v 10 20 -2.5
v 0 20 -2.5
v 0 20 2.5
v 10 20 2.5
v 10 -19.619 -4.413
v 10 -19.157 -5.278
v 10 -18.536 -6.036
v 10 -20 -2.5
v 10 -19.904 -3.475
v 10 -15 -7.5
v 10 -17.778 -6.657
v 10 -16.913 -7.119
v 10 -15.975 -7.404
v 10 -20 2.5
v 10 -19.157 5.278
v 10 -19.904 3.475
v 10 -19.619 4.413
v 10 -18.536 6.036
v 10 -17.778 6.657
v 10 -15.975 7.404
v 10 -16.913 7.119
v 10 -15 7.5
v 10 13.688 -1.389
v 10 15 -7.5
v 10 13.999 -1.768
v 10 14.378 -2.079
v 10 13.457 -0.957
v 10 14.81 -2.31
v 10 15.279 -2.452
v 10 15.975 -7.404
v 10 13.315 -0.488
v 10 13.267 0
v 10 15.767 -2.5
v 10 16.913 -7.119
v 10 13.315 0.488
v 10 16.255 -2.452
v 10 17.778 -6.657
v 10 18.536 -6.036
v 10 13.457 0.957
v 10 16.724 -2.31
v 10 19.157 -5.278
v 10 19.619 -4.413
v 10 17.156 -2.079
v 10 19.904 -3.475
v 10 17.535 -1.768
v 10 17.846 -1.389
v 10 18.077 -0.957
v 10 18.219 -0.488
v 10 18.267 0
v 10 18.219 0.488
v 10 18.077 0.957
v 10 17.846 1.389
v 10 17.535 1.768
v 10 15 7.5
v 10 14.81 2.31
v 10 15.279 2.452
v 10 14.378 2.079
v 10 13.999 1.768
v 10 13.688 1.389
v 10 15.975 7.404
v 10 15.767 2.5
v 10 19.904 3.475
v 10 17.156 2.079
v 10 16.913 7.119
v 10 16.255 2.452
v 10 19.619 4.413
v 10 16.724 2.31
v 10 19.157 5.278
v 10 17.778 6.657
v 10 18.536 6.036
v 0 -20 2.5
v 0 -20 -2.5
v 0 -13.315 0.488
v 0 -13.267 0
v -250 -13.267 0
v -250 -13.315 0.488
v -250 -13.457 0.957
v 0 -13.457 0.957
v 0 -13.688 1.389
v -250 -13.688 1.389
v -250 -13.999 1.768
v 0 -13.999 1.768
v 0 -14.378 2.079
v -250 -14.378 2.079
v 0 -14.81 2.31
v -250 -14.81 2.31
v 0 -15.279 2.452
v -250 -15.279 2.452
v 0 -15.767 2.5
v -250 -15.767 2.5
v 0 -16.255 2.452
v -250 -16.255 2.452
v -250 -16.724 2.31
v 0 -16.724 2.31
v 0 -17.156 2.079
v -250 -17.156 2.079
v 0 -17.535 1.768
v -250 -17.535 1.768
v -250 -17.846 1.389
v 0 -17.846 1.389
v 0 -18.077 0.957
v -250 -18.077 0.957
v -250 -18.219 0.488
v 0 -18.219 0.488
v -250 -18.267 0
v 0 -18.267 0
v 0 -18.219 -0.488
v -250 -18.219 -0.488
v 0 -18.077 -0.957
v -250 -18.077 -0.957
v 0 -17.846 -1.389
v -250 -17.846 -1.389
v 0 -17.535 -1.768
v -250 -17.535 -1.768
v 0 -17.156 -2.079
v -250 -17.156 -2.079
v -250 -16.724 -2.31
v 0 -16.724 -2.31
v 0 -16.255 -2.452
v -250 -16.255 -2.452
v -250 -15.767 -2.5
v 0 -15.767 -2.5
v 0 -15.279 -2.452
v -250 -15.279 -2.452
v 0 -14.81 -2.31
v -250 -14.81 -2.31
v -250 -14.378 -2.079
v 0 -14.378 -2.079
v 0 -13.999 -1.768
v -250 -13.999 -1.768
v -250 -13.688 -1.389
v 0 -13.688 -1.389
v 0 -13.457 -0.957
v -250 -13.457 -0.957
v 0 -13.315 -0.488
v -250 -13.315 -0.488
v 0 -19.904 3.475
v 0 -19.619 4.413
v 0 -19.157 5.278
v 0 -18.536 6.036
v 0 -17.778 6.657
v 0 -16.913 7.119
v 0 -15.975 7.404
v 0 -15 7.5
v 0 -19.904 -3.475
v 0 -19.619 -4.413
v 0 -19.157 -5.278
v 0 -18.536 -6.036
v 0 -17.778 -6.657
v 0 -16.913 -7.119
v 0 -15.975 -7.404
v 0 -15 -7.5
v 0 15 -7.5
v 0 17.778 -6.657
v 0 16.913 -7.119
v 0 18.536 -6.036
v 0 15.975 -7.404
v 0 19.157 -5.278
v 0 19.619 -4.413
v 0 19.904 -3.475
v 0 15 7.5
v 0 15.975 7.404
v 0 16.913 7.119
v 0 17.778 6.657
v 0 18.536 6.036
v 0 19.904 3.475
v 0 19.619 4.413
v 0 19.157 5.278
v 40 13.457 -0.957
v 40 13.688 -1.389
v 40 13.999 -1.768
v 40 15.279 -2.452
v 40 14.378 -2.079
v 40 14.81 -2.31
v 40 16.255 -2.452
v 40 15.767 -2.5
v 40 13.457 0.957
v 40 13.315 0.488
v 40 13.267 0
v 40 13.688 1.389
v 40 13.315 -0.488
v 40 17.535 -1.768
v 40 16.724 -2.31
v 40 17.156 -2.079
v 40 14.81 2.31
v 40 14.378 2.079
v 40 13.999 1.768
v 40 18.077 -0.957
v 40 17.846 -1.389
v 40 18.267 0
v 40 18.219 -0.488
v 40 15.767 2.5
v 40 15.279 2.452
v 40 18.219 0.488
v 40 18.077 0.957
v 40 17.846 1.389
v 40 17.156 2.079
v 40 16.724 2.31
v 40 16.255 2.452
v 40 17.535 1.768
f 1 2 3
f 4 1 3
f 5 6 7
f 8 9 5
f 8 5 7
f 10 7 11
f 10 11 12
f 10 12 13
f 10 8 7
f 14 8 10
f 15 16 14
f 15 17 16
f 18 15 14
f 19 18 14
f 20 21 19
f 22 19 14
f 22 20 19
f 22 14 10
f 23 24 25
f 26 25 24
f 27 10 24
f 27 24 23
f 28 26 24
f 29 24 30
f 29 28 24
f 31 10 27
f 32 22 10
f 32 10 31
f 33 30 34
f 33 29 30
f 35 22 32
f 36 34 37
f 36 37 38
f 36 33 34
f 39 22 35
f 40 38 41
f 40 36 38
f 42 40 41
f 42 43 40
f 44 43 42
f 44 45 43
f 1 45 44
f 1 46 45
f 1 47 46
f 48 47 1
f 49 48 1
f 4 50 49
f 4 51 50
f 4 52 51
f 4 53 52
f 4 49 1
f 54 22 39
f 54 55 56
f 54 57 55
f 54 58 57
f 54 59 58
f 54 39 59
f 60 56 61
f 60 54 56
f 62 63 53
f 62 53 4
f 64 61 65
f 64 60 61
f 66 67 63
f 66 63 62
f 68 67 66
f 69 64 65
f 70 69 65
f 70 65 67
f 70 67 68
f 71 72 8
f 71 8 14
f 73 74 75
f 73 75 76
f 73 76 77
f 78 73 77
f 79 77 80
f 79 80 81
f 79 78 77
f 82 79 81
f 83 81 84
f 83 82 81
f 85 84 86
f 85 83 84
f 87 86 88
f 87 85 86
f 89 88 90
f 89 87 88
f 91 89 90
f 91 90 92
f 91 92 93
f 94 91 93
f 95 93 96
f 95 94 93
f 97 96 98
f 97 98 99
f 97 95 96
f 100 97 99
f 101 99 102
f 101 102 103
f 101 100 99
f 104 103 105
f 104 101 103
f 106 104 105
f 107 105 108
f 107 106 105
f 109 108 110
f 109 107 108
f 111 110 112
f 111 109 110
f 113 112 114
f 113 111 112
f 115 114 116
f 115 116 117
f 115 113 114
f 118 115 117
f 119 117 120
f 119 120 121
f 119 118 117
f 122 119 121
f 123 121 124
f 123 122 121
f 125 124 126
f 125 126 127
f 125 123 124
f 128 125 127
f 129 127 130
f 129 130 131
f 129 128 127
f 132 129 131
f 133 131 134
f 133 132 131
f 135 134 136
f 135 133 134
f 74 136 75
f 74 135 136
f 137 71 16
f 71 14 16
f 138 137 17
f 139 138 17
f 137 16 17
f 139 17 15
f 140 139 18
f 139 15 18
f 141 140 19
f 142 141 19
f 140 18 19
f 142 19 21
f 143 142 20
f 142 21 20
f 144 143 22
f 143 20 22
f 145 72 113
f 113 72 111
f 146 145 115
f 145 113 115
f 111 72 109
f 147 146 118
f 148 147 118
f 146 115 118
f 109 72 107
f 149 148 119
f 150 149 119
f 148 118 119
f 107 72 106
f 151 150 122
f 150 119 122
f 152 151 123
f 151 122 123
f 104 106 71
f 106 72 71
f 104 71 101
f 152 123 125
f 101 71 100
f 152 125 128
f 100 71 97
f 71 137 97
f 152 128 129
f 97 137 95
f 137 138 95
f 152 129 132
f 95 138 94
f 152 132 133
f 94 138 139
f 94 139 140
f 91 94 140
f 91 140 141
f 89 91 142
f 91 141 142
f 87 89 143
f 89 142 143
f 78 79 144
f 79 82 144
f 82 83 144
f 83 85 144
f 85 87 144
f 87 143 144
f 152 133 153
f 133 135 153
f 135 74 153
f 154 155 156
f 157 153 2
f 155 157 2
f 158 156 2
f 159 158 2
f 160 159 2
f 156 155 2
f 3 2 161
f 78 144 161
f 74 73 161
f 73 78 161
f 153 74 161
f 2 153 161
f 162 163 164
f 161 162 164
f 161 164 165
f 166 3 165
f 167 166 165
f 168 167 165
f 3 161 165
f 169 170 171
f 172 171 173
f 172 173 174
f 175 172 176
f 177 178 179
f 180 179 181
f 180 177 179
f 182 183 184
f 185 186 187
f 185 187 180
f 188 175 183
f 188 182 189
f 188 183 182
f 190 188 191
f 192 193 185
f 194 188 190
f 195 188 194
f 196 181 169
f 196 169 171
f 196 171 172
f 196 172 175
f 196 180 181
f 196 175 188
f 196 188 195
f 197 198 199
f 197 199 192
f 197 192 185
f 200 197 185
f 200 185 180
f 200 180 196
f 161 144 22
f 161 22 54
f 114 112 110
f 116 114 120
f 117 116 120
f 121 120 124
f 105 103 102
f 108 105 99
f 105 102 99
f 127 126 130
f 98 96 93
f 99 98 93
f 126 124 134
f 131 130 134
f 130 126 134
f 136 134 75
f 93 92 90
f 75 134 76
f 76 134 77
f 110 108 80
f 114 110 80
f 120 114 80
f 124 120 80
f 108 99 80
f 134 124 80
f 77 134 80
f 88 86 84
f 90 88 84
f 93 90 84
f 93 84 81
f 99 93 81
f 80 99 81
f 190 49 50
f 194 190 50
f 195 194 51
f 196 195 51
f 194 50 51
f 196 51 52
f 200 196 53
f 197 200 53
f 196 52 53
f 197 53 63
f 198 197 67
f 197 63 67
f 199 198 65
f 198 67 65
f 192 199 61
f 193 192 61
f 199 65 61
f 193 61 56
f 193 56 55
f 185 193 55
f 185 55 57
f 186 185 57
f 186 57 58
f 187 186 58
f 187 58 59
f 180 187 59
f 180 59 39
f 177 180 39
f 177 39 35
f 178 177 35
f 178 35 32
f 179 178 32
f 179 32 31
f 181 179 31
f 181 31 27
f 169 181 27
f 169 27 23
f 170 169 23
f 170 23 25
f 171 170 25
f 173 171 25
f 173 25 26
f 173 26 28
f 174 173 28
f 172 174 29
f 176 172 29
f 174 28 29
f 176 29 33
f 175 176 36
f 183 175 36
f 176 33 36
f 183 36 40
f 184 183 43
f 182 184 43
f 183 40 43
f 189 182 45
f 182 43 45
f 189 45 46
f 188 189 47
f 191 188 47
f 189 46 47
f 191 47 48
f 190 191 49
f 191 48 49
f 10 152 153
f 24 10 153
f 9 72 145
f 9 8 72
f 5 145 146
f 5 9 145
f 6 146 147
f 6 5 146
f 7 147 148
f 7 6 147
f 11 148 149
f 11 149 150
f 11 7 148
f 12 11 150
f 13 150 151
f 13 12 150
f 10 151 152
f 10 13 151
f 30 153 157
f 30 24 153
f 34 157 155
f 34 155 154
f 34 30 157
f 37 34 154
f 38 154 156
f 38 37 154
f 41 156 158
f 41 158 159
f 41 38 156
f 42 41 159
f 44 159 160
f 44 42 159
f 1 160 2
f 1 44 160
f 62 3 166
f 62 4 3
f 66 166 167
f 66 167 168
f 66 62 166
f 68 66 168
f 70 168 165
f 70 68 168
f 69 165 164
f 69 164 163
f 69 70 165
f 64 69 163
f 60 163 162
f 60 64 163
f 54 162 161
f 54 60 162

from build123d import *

# Parameters (mm, degrees)
F0_W     = 40
F0_H     = 15
F0_R     = 2.5
F1_DEPTH = 10
F2_R     = 5
F3_DEPTH = 40
F4_DEPTH = 250


with BuildPart() as f1:
    # F0 (on Right) → F1 (new body)
    with BuildSketch(Plane.YZ):
        Rectangle(F0_W, F0_H)
        with Locations((-15.766867, 0)):
            Circle(F0_R, mode=Mode.SUBTRACT)
        with Locations((15.766867, 0)):
            Circle(F0_R, mode=Mode.SUBTRACT)
        with Locations((-15.766867, 0)):
            Circle(F0_R)
    extrude(amount=F1_DEPTH)

    # F2
    f2_edges = [f1.edges().sort_by_distance(p)[0] for p in [
        (5, -20, 7.5),
        (5, 20, 7.5),
        (5, -20, -7.5),
        (5, 20, -7.5),
    ]]
    fillet(f2_edges, radius=F2_R)

    # F0 (on Right) → F3 (join)
    with BuildSketch(Plane.YZ):
        with Locations((15.766867, 0)):
            Circle(F0_R)
    extrude(amount=F3_DEPTH)

    # F0 (on Right) → F4 (join)
    with BuildSketch(Plane.YZ):
        with Locations((-15.766867, 0)):
            Circle(F0_R)
    extrude(amount=-F4_DEPTH)


solid = f1.part
